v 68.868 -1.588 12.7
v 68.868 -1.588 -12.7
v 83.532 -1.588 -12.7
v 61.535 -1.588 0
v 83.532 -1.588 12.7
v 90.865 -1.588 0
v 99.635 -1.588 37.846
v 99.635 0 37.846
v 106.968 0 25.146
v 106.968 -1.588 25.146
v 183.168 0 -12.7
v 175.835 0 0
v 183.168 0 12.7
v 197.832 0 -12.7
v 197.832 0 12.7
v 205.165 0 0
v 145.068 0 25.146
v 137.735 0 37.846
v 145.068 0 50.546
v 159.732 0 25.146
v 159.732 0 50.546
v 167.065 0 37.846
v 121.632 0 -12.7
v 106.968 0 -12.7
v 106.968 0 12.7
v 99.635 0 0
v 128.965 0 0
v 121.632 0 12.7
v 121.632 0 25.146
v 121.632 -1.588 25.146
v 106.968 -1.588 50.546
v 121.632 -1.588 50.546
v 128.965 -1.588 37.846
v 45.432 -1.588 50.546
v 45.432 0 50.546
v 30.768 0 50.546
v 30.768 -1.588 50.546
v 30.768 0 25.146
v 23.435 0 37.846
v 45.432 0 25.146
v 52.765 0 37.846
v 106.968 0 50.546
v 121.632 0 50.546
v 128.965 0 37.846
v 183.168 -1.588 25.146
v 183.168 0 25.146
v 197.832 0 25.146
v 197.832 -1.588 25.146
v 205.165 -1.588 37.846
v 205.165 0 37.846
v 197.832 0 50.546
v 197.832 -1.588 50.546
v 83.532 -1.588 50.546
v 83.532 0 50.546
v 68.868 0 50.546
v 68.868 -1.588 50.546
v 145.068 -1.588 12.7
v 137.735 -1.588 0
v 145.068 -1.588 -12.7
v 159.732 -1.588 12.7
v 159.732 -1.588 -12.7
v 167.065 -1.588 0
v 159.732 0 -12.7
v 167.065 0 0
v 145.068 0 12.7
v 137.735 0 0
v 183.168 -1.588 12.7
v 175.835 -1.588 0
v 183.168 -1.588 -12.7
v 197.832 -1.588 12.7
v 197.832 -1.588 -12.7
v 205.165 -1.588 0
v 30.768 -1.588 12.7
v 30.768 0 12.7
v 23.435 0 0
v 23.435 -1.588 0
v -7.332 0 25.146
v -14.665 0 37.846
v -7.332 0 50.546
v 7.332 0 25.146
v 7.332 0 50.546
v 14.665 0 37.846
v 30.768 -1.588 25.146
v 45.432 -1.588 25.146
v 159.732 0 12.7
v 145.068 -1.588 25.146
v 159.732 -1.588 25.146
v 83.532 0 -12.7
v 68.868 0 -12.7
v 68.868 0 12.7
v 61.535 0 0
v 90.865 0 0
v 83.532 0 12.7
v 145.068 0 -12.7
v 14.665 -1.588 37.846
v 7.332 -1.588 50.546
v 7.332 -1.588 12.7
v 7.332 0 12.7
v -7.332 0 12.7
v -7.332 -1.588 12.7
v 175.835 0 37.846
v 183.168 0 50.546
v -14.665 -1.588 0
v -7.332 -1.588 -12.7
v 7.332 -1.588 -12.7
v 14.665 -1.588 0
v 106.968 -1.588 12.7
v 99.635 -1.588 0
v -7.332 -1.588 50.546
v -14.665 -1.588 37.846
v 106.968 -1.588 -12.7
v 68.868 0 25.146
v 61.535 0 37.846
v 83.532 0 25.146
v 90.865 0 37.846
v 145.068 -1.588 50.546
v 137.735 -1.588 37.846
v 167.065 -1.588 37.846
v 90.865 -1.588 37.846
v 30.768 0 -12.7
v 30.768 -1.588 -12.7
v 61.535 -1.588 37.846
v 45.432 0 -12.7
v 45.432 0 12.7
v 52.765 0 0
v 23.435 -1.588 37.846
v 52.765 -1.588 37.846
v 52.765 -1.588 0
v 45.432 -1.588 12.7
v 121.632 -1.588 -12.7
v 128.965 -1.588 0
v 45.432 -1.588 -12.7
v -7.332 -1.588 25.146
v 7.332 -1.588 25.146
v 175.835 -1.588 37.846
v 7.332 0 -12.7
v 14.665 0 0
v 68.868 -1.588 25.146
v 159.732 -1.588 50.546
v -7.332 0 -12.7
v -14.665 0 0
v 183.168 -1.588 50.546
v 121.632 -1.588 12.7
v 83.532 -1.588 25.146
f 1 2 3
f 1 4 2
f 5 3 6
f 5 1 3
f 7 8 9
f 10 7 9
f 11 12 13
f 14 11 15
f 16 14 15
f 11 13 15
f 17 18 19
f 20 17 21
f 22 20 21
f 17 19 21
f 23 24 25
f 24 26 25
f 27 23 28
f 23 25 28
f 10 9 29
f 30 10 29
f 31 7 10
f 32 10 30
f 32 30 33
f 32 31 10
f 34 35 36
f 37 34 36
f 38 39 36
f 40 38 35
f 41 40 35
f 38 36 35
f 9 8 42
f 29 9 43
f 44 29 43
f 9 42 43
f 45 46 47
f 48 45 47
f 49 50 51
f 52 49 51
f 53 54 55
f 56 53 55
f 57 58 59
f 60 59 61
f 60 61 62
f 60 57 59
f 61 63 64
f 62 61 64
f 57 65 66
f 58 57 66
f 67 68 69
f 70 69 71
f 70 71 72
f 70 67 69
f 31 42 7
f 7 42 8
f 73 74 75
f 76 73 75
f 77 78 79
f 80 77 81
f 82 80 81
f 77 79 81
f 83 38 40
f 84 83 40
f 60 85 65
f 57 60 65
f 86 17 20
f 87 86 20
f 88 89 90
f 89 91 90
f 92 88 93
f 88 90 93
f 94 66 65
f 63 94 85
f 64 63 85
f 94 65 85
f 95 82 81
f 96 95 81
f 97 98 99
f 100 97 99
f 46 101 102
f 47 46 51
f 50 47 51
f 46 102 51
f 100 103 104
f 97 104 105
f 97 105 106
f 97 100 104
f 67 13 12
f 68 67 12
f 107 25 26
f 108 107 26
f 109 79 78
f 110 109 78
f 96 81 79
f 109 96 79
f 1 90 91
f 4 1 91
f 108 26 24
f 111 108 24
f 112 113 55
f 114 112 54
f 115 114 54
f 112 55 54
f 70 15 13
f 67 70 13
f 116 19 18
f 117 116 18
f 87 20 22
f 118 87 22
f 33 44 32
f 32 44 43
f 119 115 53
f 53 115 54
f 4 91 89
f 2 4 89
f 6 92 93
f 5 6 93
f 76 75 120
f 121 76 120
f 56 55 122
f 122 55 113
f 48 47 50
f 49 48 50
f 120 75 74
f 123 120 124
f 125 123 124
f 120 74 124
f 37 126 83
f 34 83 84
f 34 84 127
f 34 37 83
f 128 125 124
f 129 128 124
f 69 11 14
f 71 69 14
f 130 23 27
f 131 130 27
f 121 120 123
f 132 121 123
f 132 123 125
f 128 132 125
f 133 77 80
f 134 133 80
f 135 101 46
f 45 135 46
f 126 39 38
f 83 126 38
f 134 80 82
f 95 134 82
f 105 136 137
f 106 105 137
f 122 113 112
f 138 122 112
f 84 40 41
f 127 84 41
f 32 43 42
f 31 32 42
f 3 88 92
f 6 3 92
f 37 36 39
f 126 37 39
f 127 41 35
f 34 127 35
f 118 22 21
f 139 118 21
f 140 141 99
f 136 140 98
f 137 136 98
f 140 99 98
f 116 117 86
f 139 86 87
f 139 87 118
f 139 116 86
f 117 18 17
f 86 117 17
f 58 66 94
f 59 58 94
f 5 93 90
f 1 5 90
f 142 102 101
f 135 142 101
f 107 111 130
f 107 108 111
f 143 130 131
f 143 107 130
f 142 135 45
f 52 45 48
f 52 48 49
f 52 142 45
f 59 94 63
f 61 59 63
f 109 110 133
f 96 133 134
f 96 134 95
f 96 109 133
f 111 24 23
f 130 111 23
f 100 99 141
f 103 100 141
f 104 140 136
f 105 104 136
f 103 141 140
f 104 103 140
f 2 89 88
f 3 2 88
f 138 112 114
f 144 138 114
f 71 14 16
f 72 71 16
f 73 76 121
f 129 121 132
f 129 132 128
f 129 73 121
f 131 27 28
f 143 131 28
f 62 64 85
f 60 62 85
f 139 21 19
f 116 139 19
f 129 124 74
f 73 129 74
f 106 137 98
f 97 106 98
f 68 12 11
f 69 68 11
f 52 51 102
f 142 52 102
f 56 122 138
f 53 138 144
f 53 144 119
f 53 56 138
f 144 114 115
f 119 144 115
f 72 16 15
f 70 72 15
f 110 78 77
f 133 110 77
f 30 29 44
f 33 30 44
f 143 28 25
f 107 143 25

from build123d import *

# Parameters (mm, degrees)
F1_DEPTH = 1.5875


with BuildPart() as f1:
    # F0 (on Front) → F1 (new body)
    with BuildSketch(Plane.XZ):
        Polygon((7.332348, 12.7), (-7.332348, 12.7), (-14.664697, 0), (-7.332348, -12.7), (7.332348, -12.7), (14.664697, 0), align=None)
        Polygon((30.767652, -12.7), (45.432348, -12.7), (52.764697, 0), (45.432348, 12.7), (30.767652, 12.7), (23.435303, 0), align=None)
        Polygon((68.867652, -12.7), (83.532348, -12.7), (90.864697, 0), (83.532348, 12.7), (68.867652, 12.7), (61.535303, 0), align=None)
        Polygon((106.967652, -12.7), (121.632348, -12.7), (128.964697, 0), (121.632348, 12.7), (106.967652, 12.7), (99.635303, 0), align=None)
        Polygon((145.067652, -12.7), (159.732348, -12.7), (167.064697, 0), (159.732348, 12.7), (145.067652, 12.7), (137.735303, 0), align=None)
        Polygon((183.167652, -12.7), (197.832348, -12.7), (205.164697, 0), (197.832348, 12.7), (183.167652, 12.7), (175.835303, 0), align=None)
        Polygon((183.167652, 50.546), (175.835303, 37.846), (183.167652, 25.146), (197.832348, 25.146), (205.164697, 37.846), (197.832348, 50.546), align=None)
        Polygon((167.064697, 37.846), (159.732348, 50.546), (145.067652, 50.546), (137.735303, 37.846), (145.067652, 25.146), (159.732348, 25.146), align=None)
        Polygon((106.967652, 50.546), (99.635303, 37.846), (106.967652, 25.146), (121.632348, 25.146), (128.964697, 37.846), (121.632348, 50.546), align=None)
        Polygon((90.864697, 37.846), (83.532348, 50.546), (68.867652, 50.546), (61.535303, 37.846), (68.867652, 25.146), (83.532348, 25.146), align=None)
        Polygon((30.767652, 25.146), (45.432348, 25.146), (52.764697, 37.846), (45.432348, 50.546), (30.767652, 50.546), (23.435303, 37.846), align=None)
        Polygon((-14.664697, 37.846), (-7.332348, 25.146), (7.332348, 25.146), (14.664697, 37.846), (7.332348, 50.546), (-7.332348, 50.546), align=None)
    extrude(amount=F1_DEPTH)


solid = f1.part
